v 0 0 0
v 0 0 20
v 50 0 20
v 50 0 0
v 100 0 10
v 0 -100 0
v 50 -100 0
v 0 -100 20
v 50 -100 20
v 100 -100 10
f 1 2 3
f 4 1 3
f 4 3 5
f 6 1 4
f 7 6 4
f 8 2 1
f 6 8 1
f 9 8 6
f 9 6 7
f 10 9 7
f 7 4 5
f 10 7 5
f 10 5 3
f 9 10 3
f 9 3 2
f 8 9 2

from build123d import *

# Parameters (mm, degrees)
F1_DEPTH = 100


with BuildPart() as f1:
    # F0 (on Front) → F1 (new body)
    with BuildSketch(Plane.XZ):
        Polygon((0, 20), (0, 0), (50, 0), (50, 10), (50, 20), align=None)
        Polygon((50, 20), (50, 10), (100, 10), align=None)
        Polygon((50, 10), (50, 0), (100, 10), align=None)
    extrude(amount=F1_DEPTH)


solid = f1.part
